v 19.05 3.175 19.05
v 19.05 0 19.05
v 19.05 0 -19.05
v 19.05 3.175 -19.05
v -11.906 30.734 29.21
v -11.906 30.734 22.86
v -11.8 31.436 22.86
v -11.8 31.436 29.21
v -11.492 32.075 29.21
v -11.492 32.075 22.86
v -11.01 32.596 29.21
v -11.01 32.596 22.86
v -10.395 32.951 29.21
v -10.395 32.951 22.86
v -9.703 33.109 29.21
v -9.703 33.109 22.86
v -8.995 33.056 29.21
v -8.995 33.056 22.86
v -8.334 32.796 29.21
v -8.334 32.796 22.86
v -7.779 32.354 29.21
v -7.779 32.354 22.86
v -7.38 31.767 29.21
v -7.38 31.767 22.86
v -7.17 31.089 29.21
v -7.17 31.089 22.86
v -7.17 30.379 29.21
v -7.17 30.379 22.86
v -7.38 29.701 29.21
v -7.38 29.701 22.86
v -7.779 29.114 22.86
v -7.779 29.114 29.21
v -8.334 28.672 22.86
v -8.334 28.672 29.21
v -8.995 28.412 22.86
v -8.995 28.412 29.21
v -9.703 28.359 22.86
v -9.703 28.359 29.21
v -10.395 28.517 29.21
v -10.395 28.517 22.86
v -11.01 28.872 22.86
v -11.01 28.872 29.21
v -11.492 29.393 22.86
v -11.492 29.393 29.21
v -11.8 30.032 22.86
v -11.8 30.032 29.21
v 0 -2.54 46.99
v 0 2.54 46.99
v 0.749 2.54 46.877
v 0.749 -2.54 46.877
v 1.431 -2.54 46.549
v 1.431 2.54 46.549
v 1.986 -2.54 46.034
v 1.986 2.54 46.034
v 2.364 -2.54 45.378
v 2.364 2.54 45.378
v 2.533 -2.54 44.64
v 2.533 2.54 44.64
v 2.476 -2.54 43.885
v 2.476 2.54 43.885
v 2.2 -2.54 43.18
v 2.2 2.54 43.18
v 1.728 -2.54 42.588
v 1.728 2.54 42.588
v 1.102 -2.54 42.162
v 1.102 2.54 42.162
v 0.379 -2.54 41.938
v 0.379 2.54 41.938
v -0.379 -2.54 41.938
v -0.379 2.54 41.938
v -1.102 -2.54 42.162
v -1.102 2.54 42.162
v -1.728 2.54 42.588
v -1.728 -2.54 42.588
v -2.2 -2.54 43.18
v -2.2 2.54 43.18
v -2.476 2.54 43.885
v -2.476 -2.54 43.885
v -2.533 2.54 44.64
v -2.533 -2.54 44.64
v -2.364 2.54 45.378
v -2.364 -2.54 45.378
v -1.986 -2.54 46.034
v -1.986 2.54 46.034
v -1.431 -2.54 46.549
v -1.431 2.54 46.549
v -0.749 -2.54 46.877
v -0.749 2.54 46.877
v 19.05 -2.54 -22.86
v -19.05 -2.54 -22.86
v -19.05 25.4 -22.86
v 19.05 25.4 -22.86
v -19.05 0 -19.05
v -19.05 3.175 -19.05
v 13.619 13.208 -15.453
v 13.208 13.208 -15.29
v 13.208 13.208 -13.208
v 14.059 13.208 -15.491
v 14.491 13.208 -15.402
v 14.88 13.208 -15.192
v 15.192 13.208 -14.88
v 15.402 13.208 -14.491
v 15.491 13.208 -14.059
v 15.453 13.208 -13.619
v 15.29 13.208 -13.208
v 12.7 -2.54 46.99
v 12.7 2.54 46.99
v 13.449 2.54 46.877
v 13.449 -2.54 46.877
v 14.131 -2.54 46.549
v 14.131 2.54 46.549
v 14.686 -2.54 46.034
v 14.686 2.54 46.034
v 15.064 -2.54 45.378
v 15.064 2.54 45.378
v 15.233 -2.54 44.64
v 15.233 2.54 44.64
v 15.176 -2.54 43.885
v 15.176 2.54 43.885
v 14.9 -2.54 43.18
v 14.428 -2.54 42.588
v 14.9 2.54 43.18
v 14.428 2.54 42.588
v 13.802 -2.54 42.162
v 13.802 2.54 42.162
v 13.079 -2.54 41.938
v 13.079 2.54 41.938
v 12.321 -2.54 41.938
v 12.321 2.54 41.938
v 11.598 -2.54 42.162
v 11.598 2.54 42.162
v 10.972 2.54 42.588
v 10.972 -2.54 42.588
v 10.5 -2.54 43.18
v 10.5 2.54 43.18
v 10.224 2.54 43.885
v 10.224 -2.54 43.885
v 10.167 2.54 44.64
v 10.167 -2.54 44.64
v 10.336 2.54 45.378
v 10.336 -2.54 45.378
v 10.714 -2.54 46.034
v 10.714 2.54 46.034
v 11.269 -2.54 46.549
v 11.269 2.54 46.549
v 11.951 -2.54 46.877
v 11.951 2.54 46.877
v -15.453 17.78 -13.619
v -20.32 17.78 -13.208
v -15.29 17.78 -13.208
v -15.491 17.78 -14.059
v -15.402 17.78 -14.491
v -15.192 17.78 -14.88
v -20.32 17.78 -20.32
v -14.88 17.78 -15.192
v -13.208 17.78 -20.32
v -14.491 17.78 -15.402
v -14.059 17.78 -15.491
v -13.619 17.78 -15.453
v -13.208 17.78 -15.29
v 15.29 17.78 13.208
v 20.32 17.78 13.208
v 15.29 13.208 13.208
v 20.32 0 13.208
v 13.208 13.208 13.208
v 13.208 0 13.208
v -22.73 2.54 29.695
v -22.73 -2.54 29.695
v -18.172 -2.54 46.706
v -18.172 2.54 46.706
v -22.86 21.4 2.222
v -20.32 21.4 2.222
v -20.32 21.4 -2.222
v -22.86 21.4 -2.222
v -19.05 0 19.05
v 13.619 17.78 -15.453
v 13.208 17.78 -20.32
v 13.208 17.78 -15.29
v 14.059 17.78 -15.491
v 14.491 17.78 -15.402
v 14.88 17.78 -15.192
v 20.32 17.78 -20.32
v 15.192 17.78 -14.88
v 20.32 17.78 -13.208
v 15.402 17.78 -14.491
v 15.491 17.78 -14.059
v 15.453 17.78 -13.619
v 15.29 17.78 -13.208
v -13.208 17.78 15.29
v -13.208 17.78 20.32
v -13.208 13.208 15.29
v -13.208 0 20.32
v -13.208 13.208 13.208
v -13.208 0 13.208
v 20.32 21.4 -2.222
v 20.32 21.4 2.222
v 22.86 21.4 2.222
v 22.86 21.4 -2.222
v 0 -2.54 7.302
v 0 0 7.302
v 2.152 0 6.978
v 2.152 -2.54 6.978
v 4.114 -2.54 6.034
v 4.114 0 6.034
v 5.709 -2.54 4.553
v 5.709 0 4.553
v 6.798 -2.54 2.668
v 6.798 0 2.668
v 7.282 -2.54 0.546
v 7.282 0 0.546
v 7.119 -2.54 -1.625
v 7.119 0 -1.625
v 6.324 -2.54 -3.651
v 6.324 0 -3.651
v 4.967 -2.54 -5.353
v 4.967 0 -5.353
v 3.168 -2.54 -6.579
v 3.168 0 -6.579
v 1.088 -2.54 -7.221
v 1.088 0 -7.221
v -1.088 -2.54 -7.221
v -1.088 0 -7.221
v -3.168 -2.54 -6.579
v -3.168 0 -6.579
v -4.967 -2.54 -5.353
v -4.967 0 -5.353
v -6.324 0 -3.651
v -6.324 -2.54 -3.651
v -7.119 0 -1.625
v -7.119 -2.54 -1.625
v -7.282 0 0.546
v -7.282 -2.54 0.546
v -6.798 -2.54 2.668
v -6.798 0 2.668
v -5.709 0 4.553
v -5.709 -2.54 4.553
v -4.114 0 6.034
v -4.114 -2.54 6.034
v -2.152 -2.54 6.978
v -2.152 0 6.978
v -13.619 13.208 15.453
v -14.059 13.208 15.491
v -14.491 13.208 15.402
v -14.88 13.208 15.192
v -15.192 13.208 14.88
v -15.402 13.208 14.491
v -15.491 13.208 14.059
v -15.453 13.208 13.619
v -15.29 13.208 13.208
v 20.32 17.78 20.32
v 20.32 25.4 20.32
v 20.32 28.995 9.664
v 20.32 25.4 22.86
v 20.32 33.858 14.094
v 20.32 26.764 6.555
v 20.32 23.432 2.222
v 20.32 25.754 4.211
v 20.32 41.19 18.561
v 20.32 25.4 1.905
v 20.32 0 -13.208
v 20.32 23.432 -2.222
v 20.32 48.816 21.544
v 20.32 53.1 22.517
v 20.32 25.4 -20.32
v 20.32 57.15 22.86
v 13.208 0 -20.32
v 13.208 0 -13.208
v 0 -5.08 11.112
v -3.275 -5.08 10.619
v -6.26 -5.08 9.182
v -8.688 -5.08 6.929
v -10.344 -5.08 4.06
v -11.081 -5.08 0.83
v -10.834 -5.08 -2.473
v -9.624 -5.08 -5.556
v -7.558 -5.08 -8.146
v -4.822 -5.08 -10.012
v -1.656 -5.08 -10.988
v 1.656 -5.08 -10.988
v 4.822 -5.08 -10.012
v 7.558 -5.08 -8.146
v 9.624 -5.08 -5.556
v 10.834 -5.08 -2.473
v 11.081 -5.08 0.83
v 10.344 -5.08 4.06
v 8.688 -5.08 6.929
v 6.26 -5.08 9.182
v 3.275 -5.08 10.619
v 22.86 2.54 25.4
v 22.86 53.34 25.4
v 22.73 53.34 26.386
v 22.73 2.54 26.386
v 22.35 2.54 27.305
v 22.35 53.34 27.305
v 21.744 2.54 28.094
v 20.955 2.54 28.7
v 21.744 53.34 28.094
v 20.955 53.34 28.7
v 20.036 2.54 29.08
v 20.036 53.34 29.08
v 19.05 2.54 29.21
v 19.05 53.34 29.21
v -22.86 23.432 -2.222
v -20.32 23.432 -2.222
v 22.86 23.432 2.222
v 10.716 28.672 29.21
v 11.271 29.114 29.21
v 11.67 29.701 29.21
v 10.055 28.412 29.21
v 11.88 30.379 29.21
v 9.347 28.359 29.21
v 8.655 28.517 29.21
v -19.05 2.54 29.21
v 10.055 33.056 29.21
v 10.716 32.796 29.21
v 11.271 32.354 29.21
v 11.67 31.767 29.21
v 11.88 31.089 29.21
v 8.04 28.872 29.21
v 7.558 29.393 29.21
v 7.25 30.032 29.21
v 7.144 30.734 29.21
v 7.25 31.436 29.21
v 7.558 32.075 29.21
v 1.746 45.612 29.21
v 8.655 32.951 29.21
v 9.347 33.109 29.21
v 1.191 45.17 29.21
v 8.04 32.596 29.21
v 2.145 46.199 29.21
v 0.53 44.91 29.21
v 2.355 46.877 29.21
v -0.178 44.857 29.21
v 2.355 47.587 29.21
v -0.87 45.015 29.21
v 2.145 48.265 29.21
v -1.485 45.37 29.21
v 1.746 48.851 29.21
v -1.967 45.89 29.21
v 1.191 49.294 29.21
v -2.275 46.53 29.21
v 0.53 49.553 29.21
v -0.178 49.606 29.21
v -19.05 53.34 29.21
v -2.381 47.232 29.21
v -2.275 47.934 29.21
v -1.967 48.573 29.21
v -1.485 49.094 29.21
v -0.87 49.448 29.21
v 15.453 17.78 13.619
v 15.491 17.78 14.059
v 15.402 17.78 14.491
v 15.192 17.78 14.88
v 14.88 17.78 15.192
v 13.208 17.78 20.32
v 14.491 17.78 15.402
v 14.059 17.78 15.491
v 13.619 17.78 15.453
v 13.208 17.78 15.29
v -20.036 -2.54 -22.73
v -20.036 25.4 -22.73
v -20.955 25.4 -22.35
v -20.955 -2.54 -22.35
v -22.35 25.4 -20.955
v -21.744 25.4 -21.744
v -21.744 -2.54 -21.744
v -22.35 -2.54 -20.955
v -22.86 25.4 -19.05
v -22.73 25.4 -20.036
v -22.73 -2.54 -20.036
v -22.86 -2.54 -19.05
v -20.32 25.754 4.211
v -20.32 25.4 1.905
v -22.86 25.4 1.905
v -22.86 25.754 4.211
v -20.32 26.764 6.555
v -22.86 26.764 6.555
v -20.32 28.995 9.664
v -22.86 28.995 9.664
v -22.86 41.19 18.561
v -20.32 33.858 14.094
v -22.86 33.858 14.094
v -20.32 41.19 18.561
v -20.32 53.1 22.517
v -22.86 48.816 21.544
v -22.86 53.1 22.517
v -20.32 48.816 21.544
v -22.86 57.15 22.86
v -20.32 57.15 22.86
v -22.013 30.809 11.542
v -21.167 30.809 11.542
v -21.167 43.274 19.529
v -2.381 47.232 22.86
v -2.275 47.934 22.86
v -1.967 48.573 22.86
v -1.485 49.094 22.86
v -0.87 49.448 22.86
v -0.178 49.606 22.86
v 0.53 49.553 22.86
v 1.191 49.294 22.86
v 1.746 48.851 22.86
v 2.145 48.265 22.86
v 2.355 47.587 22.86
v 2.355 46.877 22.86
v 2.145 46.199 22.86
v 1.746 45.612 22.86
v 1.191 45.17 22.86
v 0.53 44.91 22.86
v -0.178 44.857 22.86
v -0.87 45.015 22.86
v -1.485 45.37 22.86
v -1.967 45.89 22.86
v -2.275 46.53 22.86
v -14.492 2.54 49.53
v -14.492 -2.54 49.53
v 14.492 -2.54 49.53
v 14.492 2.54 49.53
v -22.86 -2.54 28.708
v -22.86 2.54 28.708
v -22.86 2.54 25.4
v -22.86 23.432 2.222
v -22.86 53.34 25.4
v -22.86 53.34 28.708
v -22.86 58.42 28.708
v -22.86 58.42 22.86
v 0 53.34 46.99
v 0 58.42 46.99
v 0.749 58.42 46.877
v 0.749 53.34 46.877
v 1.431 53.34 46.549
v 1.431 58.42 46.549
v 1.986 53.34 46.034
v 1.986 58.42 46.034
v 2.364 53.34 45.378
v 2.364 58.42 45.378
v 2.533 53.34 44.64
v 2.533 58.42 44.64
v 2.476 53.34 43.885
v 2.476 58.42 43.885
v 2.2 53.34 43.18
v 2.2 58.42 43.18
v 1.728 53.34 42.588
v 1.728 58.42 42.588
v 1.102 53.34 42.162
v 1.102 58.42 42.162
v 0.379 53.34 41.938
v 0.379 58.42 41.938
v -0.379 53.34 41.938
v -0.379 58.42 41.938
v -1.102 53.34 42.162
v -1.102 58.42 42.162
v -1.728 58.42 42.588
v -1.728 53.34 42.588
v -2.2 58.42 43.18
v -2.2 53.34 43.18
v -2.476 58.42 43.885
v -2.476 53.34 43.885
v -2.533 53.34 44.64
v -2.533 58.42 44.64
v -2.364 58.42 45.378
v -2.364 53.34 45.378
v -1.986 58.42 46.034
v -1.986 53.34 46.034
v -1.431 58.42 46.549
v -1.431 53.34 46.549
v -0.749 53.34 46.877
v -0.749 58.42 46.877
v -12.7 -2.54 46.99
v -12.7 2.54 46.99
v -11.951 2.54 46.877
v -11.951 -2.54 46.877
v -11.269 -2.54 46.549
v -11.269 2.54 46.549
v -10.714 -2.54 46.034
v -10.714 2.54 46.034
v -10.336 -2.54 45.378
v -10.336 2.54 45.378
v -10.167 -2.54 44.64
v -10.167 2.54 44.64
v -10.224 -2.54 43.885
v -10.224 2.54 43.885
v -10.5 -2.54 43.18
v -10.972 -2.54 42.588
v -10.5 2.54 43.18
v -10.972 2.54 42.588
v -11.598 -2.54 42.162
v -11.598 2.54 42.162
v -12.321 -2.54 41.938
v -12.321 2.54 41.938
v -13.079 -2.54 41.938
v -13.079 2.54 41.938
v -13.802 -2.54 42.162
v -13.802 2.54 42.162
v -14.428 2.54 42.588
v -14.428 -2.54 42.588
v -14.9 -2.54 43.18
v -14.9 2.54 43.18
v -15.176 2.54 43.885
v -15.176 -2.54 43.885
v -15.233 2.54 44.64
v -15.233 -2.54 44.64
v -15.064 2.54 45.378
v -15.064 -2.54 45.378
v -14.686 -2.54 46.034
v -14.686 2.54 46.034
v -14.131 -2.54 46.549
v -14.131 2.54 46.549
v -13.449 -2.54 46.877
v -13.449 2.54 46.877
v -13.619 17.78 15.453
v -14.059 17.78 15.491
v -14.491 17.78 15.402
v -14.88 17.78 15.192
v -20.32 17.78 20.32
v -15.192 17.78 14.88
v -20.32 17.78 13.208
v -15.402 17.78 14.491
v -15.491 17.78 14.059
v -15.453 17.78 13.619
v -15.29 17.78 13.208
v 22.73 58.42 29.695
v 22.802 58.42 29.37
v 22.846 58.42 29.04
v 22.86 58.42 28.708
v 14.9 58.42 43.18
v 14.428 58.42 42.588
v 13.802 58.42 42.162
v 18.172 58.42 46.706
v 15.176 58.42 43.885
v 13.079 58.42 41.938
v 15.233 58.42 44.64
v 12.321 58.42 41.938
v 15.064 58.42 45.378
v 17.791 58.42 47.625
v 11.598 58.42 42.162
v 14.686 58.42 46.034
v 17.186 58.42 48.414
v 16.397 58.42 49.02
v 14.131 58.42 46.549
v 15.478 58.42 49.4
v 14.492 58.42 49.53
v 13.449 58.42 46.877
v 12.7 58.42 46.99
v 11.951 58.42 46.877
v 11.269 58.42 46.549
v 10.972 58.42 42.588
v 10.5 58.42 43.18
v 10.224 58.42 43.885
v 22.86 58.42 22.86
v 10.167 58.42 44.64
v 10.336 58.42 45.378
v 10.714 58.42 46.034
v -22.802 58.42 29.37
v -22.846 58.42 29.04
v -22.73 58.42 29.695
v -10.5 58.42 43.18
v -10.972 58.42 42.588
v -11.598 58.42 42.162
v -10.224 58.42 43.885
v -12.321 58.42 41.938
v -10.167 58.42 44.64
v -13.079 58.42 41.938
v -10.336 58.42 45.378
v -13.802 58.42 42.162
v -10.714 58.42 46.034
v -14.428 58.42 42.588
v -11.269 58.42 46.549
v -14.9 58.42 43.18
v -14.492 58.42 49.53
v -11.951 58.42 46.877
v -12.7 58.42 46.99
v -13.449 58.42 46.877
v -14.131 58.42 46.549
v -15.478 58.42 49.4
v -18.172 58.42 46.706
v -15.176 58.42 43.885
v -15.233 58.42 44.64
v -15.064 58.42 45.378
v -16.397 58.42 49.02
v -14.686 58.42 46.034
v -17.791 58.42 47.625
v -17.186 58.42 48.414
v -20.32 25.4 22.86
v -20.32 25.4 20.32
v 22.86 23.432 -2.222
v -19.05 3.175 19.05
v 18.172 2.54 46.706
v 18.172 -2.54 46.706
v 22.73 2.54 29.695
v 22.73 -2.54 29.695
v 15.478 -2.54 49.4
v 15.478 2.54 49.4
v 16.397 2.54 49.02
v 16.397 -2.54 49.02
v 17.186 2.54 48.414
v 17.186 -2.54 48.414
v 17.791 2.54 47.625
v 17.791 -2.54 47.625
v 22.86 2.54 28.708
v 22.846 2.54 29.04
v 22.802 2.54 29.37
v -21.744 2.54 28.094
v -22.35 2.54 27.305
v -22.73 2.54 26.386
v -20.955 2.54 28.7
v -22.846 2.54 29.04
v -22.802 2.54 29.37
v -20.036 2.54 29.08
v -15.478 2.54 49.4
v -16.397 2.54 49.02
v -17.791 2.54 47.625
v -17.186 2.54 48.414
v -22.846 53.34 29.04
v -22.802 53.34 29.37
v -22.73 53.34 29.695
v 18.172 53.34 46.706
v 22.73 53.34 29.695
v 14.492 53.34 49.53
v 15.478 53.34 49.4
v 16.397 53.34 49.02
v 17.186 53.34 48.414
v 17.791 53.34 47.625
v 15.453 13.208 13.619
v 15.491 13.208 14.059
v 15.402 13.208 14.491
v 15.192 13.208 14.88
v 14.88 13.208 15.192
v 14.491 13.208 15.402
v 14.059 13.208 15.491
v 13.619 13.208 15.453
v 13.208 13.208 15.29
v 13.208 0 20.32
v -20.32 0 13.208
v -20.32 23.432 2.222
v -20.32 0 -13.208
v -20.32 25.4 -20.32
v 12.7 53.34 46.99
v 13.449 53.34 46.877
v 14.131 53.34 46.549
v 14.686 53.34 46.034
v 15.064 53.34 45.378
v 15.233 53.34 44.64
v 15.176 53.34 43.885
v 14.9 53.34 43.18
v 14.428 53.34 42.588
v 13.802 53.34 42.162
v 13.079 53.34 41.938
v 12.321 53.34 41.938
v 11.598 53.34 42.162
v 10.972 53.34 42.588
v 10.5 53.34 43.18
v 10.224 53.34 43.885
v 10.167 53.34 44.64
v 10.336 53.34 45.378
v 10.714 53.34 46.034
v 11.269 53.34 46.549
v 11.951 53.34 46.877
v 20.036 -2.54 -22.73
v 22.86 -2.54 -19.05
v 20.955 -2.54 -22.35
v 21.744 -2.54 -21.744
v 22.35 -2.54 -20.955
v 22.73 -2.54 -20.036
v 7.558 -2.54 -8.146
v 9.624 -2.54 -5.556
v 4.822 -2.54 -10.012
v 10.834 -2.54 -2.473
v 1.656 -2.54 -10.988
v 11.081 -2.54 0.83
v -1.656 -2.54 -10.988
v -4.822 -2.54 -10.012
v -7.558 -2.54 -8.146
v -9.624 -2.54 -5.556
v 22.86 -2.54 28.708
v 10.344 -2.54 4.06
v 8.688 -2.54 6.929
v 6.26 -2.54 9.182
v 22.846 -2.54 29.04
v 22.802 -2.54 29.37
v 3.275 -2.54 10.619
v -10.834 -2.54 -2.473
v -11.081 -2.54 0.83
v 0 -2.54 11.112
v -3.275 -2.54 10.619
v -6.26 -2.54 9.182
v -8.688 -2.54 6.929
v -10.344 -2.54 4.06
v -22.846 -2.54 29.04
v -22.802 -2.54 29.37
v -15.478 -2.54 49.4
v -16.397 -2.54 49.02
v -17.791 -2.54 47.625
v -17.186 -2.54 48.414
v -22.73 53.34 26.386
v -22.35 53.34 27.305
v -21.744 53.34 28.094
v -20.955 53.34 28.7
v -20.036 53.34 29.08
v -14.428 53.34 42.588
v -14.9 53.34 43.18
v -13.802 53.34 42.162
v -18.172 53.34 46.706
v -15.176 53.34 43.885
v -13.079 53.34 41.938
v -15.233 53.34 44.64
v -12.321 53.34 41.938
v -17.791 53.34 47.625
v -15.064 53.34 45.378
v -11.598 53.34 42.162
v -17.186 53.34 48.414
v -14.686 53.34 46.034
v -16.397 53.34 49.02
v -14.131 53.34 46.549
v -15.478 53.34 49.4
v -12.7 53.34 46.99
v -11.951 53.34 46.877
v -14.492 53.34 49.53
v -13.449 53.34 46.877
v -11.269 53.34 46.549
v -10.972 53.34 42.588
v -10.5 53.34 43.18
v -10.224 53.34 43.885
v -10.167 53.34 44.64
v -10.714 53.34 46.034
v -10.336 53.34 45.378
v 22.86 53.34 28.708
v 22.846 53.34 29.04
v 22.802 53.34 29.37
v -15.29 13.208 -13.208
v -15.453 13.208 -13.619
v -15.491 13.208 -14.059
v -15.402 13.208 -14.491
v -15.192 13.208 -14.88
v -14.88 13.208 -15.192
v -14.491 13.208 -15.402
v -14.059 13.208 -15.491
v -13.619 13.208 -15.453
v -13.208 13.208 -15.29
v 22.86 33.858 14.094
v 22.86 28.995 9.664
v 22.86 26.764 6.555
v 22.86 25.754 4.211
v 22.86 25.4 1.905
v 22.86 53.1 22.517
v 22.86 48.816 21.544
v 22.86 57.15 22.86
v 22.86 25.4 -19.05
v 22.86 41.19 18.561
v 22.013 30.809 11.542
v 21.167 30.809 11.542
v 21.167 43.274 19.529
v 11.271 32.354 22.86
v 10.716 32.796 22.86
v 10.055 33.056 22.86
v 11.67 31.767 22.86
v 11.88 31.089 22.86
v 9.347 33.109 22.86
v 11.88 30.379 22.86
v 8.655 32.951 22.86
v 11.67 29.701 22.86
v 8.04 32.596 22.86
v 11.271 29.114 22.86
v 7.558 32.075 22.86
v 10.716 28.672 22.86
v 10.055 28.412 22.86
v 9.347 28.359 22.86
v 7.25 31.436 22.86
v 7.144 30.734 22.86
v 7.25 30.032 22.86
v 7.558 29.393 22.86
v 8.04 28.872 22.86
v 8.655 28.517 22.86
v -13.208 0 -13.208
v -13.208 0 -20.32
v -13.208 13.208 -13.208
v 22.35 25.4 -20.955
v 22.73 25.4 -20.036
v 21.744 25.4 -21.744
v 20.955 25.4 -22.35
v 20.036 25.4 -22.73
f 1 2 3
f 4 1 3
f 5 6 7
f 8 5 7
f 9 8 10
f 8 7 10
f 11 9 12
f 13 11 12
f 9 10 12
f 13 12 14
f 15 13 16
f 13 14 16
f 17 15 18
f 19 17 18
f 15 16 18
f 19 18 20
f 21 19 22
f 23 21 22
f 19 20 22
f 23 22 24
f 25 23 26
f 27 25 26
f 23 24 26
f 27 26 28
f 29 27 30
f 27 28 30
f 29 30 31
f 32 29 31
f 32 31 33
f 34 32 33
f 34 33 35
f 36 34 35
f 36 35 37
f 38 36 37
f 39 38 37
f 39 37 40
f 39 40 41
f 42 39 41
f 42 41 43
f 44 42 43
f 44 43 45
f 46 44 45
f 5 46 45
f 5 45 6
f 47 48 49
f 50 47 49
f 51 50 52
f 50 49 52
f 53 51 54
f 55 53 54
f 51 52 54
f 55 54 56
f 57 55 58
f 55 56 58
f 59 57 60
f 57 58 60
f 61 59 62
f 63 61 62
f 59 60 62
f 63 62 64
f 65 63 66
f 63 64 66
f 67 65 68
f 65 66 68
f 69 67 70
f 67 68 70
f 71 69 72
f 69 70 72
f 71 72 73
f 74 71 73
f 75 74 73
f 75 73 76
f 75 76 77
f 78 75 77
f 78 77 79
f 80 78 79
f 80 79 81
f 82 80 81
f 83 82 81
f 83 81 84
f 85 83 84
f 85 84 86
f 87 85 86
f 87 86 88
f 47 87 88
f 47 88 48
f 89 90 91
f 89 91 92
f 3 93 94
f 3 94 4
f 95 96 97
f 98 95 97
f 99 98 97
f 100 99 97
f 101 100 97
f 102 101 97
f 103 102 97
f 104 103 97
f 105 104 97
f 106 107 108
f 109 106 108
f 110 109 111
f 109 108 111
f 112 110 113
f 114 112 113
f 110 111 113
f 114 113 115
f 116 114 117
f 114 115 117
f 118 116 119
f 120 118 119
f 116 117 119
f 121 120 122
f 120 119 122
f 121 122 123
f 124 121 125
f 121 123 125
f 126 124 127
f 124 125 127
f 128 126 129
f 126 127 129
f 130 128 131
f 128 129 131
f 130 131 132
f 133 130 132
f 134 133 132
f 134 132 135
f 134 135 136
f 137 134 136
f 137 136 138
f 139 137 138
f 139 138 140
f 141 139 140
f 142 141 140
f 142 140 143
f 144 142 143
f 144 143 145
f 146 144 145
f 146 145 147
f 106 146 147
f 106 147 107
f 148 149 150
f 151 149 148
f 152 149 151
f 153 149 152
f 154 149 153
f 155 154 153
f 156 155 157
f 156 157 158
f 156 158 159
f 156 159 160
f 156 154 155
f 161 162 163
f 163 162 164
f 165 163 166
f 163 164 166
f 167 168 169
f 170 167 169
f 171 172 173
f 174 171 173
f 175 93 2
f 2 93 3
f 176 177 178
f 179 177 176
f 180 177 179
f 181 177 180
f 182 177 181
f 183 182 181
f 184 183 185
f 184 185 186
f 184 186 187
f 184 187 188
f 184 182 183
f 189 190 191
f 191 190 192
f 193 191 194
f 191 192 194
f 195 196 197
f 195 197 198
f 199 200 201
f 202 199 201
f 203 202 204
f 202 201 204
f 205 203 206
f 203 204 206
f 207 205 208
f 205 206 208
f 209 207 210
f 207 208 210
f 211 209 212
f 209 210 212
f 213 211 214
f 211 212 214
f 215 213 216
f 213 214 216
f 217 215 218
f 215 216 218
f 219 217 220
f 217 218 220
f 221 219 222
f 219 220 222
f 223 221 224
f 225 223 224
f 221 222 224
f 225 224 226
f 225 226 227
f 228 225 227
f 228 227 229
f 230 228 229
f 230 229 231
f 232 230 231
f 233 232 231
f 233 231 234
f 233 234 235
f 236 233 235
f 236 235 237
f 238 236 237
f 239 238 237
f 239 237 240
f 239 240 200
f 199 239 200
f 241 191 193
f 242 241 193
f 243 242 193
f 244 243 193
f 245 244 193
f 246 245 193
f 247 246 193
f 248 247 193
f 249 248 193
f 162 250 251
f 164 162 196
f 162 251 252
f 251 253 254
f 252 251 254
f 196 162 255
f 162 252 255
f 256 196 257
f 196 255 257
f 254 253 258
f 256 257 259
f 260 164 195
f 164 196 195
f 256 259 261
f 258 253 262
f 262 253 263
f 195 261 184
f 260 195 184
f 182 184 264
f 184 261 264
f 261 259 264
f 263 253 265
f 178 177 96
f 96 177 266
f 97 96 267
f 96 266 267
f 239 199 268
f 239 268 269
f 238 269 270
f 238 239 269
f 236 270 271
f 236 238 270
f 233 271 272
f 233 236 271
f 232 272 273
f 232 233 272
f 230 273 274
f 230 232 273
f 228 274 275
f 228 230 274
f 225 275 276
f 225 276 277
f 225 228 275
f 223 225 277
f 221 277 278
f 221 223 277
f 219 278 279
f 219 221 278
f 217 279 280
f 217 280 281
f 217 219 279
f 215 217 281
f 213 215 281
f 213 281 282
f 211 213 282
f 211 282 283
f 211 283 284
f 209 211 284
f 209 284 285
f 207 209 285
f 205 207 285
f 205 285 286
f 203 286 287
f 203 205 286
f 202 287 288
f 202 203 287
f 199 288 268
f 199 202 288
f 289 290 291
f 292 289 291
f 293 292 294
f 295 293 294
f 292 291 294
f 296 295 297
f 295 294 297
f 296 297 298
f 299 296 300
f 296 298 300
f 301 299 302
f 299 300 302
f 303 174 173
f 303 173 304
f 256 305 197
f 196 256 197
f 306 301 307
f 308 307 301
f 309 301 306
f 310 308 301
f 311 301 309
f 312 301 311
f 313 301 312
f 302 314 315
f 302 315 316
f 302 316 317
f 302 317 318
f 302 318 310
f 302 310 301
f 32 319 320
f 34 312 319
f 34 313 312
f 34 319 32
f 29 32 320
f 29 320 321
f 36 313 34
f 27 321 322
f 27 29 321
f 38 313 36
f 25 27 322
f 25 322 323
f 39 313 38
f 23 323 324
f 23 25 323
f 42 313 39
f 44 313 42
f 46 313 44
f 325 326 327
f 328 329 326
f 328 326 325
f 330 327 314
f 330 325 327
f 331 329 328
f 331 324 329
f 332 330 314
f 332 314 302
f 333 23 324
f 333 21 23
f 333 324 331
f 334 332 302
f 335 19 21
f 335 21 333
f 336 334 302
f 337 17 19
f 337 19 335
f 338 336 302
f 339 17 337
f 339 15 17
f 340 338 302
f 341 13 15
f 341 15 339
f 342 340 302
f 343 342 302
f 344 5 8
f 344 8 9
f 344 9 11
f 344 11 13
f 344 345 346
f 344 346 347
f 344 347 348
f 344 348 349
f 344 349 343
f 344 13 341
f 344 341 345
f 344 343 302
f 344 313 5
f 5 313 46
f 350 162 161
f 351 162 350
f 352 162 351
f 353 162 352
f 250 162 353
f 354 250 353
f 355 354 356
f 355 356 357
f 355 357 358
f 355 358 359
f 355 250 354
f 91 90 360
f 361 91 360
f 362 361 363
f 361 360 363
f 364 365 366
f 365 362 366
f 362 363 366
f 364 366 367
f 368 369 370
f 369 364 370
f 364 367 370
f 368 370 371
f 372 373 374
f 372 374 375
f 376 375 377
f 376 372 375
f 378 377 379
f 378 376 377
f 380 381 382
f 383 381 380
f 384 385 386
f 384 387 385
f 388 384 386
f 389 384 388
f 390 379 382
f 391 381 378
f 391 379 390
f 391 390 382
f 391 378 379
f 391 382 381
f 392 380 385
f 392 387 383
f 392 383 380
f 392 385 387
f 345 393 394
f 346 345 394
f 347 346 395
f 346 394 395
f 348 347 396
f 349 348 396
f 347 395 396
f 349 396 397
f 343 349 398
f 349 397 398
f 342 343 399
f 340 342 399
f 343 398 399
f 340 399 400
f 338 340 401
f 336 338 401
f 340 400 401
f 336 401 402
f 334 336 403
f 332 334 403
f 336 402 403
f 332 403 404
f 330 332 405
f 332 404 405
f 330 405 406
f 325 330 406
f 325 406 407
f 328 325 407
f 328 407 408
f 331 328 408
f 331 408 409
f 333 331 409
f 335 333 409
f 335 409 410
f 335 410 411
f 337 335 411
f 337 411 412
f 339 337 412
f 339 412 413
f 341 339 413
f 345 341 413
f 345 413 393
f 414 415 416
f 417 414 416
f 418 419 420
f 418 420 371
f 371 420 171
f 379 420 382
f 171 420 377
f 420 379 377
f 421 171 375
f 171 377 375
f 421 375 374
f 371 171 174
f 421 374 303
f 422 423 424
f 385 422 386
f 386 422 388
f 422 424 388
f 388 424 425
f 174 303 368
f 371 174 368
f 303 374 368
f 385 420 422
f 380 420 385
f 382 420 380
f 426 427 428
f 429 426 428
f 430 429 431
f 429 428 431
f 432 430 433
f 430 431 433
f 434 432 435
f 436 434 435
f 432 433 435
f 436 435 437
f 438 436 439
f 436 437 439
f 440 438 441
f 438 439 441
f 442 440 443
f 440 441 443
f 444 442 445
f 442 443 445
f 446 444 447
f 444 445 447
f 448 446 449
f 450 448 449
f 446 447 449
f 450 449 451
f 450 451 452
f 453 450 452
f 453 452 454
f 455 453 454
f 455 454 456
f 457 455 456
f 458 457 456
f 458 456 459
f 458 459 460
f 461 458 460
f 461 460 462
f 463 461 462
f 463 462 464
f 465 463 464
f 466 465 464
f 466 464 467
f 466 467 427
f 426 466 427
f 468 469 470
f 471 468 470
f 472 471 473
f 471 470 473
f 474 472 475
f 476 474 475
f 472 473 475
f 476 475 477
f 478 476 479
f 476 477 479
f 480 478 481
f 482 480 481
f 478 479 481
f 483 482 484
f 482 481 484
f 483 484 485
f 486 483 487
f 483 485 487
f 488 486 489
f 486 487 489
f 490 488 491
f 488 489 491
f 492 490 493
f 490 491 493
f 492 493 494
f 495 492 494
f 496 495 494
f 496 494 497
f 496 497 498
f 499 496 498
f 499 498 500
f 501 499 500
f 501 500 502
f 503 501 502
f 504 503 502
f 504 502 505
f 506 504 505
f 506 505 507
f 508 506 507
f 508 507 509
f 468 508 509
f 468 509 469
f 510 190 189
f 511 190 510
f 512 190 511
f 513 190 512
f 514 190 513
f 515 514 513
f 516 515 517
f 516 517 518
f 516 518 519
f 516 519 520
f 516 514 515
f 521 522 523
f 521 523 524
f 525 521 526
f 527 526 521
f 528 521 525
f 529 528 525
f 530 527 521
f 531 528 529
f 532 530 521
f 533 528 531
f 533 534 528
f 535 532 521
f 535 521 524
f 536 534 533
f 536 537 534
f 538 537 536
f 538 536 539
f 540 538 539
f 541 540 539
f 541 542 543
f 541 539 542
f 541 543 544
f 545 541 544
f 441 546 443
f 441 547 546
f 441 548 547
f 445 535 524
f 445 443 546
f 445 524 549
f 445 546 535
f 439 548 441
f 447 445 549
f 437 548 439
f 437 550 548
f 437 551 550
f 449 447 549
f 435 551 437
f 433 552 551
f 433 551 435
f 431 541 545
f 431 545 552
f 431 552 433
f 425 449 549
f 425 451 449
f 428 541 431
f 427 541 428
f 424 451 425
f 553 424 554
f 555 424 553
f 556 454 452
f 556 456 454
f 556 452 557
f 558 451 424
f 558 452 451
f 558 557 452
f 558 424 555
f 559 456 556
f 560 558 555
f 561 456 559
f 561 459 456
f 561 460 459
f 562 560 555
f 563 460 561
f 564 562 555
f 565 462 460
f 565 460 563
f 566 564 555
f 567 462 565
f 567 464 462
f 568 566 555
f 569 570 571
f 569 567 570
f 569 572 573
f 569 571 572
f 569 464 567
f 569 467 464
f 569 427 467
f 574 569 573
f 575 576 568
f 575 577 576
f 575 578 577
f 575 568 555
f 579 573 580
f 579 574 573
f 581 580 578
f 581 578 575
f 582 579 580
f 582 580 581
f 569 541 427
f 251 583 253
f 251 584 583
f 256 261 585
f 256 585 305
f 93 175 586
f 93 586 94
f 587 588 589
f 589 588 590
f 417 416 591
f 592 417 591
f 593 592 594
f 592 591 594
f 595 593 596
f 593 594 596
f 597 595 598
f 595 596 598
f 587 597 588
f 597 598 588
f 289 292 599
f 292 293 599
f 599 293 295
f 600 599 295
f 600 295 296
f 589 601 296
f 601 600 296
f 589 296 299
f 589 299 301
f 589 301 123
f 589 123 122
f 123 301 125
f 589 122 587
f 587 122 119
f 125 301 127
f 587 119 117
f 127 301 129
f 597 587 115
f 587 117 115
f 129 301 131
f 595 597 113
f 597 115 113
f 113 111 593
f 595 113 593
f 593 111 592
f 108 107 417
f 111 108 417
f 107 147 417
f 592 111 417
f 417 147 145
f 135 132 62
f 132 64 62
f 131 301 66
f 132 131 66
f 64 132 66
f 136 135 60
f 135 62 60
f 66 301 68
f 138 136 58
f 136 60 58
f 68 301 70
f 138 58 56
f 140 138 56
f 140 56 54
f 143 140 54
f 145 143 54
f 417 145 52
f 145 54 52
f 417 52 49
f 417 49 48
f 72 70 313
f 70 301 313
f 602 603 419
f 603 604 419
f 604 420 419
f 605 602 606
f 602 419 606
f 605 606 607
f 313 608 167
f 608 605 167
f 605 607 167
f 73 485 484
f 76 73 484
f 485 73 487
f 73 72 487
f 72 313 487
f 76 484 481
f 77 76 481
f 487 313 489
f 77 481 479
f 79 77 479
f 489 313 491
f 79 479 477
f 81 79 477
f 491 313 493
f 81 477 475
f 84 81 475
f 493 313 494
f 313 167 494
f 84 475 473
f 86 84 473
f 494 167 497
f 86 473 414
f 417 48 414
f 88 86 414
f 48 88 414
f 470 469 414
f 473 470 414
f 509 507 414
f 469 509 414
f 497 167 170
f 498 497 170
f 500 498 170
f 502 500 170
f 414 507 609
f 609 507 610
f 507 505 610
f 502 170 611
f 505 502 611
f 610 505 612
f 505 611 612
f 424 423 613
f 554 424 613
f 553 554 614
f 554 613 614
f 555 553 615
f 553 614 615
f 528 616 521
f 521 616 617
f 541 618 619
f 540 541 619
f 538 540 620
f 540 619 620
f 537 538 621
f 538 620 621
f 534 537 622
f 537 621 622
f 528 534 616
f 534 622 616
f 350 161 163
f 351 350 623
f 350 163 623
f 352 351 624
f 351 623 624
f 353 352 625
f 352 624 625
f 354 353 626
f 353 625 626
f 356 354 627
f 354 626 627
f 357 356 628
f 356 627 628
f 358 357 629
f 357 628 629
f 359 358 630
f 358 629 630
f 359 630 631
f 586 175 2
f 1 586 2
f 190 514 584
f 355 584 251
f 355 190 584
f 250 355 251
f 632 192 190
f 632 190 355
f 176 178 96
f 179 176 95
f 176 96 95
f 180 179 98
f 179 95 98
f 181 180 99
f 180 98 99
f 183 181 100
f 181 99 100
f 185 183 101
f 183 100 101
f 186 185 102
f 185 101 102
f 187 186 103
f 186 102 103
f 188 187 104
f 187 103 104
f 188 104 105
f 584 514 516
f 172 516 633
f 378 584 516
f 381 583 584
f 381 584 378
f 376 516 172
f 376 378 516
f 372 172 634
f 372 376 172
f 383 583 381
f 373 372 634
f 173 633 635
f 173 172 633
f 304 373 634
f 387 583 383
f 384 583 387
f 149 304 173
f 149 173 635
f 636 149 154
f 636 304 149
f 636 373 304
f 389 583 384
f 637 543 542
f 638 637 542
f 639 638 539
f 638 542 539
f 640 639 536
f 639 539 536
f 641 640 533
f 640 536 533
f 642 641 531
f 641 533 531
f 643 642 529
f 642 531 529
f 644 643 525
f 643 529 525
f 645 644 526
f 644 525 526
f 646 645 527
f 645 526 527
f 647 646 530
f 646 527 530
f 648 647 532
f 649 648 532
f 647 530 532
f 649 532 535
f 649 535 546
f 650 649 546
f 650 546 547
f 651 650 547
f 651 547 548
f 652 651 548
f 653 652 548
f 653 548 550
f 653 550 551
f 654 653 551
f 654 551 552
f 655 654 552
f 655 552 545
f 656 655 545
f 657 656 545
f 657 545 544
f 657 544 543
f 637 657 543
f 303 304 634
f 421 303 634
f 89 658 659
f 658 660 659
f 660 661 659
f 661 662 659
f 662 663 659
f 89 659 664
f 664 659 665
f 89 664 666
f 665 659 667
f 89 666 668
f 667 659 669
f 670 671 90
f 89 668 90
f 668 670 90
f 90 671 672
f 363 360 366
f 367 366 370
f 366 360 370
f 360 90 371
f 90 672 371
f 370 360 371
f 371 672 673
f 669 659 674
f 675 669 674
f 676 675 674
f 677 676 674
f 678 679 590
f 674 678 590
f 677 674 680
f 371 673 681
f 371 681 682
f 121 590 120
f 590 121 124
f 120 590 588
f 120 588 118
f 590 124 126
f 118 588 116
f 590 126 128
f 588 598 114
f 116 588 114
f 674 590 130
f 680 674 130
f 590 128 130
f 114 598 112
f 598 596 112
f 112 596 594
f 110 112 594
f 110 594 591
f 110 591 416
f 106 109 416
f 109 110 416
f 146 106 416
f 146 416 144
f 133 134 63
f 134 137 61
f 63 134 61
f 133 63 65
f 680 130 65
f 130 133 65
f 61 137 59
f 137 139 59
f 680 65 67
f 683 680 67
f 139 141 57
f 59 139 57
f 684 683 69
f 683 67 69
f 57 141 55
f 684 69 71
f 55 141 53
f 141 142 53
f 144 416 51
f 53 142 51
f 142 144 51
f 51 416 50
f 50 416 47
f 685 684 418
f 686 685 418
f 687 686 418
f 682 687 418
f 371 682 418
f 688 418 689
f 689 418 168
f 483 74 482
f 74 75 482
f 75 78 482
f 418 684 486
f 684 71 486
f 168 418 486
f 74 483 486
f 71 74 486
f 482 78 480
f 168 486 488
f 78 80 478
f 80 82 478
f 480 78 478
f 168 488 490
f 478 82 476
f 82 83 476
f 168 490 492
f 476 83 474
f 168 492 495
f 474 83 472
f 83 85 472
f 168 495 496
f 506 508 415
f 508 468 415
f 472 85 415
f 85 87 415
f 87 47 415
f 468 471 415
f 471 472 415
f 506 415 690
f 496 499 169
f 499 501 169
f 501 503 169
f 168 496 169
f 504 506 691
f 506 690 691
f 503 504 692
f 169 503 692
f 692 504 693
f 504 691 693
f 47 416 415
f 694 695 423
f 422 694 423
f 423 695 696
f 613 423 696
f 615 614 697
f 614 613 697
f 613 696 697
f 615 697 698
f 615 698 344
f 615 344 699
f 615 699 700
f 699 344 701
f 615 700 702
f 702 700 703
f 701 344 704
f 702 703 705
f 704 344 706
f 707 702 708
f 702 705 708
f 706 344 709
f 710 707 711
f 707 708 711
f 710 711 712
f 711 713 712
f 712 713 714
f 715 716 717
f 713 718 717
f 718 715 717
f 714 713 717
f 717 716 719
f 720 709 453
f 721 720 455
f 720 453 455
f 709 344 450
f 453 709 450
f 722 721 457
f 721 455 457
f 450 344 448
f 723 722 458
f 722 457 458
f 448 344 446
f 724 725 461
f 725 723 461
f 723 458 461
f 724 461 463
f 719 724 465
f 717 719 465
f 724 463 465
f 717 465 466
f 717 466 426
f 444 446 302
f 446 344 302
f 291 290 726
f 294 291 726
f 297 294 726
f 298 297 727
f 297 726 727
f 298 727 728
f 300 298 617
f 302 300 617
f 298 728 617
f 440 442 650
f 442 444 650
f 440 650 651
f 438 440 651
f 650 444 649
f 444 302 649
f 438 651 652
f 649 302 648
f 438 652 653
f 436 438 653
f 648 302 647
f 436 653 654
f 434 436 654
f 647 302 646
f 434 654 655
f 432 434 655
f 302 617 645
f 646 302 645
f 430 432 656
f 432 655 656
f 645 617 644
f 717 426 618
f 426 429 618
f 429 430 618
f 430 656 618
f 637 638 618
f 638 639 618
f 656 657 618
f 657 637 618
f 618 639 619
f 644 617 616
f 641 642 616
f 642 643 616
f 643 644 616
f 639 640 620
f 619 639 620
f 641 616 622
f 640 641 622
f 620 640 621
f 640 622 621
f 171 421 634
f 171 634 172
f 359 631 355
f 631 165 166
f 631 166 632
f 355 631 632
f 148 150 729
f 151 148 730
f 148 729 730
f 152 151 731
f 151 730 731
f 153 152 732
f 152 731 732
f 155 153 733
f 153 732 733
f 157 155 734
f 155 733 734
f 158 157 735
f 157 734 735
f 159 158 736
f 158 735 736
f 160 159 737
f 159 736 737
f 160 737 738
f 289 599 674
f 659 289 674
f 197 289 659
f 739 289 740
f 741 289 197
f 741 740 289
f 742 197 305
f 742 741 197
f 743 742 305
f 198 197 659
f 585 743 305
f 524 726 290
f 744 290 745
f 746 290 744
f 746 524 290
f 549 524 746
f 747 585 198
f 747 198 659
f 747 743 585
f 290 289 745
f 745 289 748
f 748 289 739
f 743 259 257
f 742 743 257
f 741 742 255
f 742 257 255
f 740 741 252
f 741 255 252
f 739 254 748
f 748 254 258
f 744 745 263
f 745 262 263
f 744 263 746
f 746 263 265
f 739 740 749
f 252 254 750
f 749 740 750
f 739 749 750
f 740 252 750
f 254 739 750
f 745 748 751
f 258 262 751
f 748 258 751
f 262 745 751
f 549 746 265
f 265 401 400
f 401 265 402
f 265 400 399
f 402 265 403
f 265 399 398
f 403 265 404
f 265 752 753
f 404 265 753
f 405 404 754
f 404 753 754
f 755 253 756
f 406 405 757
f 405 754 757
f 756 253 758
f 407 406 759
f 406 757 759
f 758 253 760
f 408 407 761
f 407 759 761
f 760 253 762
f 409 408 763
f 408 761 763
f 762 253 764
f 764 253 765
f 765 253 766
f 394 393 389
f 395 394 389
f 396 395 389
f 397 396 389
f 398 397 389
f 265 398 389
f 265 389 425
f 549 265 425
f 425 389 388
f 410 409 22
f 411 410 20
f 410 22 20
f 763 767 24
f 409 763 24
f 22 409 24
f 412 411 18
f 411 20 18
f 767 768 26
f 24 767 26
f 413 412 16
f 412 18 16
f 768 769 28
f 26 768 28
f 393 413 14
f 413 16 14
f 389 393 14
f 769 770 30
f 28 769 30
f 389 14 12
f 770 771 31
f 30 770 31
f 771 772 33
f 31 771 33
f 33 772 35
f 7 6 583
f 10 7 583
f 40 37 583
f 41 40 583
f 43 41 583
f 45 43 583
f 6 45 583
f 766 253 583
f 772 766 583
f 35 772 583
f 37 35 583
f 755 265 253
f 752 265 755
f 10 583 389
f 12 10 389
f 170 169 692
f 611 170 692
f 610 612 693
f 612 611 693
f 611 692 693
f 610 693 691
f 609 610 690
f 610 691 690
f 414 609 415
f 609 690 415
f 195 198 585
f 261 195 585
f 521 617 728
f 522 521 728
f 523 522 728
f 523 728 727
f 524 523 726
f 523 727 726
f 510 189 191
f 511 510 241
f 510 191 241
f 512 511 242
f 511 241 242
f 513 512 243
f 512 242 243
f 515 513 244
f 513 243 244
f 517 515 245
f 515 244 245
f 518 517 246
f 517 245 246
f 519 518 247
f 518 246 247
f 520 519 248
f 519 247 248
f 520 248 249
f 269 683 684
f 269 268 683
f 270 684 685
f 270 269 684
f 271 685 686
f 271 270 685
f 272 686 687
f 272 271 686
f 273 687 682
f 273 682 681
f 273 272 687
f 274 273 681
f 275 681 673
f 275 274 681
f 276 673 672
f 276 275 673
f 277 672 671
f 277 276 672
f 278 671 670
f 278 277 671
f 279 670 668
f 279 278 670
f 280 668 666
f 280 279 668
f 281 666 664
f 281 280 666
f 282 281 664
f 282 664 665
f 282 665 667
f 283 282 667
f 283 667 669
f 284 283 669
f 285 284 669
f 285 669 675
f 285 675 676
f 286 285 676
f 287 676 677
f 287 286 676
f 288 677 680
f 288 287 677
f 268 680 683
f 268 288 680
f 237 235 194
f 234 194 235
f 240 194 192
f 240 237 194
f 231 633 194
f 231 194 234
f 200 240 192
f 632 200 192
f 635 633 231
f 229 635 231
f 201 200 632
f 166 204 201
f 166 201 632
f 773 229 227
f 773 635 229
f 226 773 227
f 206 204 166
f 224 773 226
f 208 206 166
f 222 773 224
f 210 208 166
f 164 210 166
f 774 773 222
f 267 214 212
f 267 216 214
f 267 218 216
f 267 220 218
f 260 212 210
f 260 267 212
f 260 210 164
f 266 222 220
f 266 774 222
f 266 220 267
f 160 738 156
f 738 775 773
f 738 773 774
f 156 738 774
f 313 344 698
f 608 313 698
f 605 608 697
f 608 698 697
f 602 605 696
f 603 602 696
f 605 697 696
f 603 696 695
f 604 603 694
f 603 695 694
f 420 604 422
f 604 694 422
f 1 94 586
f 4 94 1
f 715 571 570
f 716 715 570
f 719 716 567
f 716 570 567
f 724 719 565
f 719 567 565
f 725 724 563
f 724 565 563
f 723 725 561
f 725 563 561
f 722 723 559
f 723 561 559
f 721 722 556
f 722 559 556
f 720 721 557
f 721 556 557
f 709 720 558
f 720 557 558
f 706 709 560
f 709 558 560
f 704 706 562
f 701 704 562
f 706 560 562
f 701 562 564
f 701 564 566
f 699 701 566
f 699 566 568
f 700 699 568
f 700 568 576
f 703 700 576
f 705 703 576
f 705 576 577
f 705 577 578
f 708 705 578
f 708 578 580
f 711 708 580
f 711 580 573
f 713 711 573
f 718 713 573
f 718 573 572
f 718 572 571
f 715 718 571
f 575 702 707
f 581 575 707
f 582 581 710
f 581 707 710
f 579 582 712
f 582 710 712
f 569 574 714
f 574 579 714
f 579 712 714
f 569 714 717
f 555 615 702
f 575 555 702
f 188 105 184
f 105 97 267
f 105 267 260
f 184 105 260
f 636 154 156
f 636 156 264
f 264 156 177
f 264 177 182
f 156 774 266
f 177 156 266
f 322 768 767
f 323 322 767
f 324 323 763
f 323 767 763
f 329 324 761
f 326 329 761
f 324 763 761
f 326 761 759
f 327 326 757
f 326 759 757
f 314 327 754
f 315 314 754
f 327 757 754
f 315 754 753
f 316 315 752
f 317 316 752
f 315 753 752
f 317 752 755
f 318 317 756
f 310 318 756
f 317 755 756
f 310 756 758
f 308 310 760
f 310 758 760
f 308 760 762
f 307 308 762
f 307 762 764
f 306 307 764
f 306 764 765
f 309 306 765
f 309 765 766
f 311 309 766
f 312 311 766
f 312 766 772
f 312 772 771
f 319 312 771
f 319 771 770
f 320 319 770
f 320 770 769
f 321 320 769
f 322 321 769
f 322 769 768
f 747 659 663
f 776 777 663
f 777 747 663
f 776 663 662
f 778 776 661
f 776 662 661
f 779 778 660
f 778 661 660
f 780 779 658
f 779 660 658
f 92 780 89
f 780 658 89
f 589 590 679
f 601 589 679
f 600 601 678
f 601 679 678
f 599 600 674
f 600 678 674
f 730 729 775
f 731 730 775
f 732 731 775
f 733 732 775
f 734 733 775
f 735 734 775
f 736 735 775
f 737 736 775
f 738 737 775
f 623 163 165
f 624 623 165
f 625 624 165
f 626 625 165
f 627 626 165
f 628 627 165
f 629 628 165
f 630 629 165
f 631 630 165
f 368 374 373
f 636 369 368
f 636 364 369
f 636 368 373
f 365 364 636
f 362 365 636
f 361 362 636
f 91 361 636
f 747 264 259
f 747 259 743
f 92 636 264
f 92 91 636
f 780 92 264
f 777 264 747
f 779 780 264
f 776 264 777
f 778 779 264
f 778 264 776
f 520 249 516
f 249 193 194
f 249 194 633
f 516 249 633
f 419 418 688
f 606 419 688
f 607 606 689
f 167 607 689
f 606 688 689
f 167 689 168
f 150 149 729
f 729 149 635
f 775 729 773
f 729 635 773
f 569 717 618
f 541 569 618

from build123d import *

# Parameters (mm, degrees)
SKETCH1_W           = 40.64
SKETCH1_H           = 40.64
BOSS_EXTRUDE1_DEPTH = 25.4
SHELL1_T            = 2.54
SKETCH2_W           = 7.112
SKETCH2_H           = 7.112
BOSS_EXTRUDE2_DEPTH = 17.78
BOSS_EXTRUDE3_DEPTH = 60.96
SKETCH5_W           = 20.32
SKETCH5_H           = 50.8
CUT_EXTRUDE1_DEPTH  = 90.198854813
SKETCH6_R           = 2.54
CUT_EXTRUDE2_DEPTH  = 82.804169209
FILLET1_R           = 3.81
SKETCH10_R          = 1.524
CUT_EXTRUDE4_DEPTH  = 4.572
CIRPATTERN1_COUNT   = 4
SKETCH11_R          = 7.3025
CUT_EXTRUDE5_DEPTH  = 80.929324406
RIB1_START          = -2.54
RIB1_DEPTH          = 2.54
SKETCH19_R          = 2.38125
CUT_EXTRUDE6_DEPTH  = 78.625990598
SKETCH20_W          = 2.032
SKETCH20_H          = 4.445
SKETCH7_W           = 38.1
SKETCH7_H           = 38.1
BOSS_EXTRUDE4_DEPTH = 3.175


with BuildPart() as part:
    # Sketch1 → Boss-Extrude1 (new body)
    with BuildSketch(Plane(origin=(0, 0, 0), x_dir=(1, 0, 0), z_dir=(0, 1, 0))):
        Rectangle(SKETCH1_W, SKETCH1_H)
    extrude(amount=BOSS_EXTRUDE1_DEPTH)

    # Shell1
    shell1_openings = [part.faces().sort_by_distance(p)[0] for p in [
        (0, 25.4, 0),
    ]]
    offset(amount=SHELL1_T, openings=shell1_openings, kind=Kind.INTERSECTION)

    # Sketch2 → Boss-Extrude2 (add)
    with BuildSketch(Plane(origin=(0, 0, 0), x_dir=(1, 0, 0), z_dir=(0, 1, 0))):
        with Locations((-16.764, 16.764)):
            Rectangle(SKETCH2_W, SKETCH2_H)
    boss_extrude2 = extrude(amount=BOSS_EXTRUDE2_DEPTH)

    # Sketch3 → Boss-Extrude3 (add)
    with BuildSketch(Plane.XZ.offset(2.54)):
        with BuildLine():
            Line((-22.730177398, 29.694504546), (-17.41527241, 49.53))
            Line((-17.41527241, 49.53), (17.41527241, 49.53))
            Line((17.41527241, 49.53), (22.730177398, 29.694504546))
            ThreePointArc((22.730177398, 29.694504546), (22.827404922, 29.205708777), (22.86, 28.708403984))
            Line((22.86, 28.708403984), (22.86, 22.86))
            Line((22.86, 22.86), (-22.86, 22.86))
            Line((-22.86, 22.86), (-22.86, 28.708403984))
            ThreePointArc((-22.86, 28.708403984), (-22.827404922, 29.205708777), (-22.730177398, 29.694504546))
        make_face()
    extrude(amount=-BOSS_EXTRUDE3_DEPTH)

    # Sketch5 → Cut-Extrude1 (cut, through all)
    with BuildSketch(Plane.ZY.offset(22.86)):
        with Locations((39.37, 27.94)):
            Rectangle(SKETCH5_W, SKETCH5_H)
    extrude(amount=-CUT_EXTRUDE1_DEPTH, mode=Mode.SUBTRACT)

    # Sketch6 → Cut-Extrude2 (cut, through all)
    with BuildSketch(Plane(origin=(0, 58.42, 0), x_dir=(1, 0, 0), z_dir=(0, 1, 0))):
        with Locations(Location((-12.7, -44.45, 0), (0, 0, 270))):
            Circle(SKETCH6_R)
        with Locations(Location((0, -44.45, 0), (0, 0, 270))):
            Circle(SKETCH6_R)
        with Locations(Location((12.7, -44.45, 0), (0, 0, 270))):
            Circle(SKETCH6_R)
    extrude(amount=-CUT_EXTRUDE2_DEPTH, mode=Mode.SUBTRACT)

    # Fillet1
    # the kernel refuses this fillet: 3.81 mm, written as the material it takes off along each edge
    with BuildSketch(Plane(origin=(-17.41527241, 46.03121044, 49.53), x_dir=(-0.25881904510252424, 0, -0.9659258262890673), z_dir=(0, 1, 0)), Plane(origin=(17.41527241, 46.03121044, 49.53), x_dir=(-1, 0, 0), z_dir=(0, 1, 0)), Plane(origin=(-17.41527241, -9.84878956, 49.53), x_dir=(-0.25881904510252424, 0, -0.9659258262890673), z_dir=(0, 1, 0)), Plane(origin=(17.41527241, -9.84878956, 49.53), x_dir=(-1, 0, 0), z_dir=(0, 1, 0))) as fillet1_piece_1:
        with BuildLine():
            CenterArc((FILLET1_R * 0.767326987979, -FILLET1_R), FILLET1_R, 90, 75)
            Line((-FILLET1_R * 0.19859883831, -FILLET1_R * 0.741180954897), (0, 0))
            Line((0, 0), (FILLET1_R * 0.767326987979, 0))
        make_face()
    extrude(amount=19.697579121, mode=Mode.SUBTRACT)
    with BuildSketch(Plane(origin=(-22.826837491, 53.34, 29.21), x_dir=(-0.008703740786851863, 0, -0.999962121730776), z_dir=(0, -1, 0))) as fillet1_piece_2:
        with BuildLine():
            CenterArc((3.776983069, 3.809855684), FILLET1_R, 180.49869391, 90)
            Line((-0.032872615, 3.776694431), (-0.413858183, 3.773378306))
            Line((-0.413858183, 3.773378306), (-0.380985568, -0.003316125))
            Line((-0.380985568, -0.003316125), (-0.04687044, -0.378106019))
            ThreePointArc((-0.04687044, -0.378106019), (0.505181779, -0.409781059), (3.813460447, -0.380985568))
            Line((3.813460447, -0.380985568), (3.810144322, 0))
        make_face()
    extrude(amount=50.8, mode=Mode.SUBTRACT)
    with BuildSketch(Plane(origin=(22.826837491, 53.34, 29.21), x_dir=(0.008703740786853719, 0, -0.999962121730776), z_dir=(0, -1, 0))) as fillet1_piece_3:
        with BuildLine():
            CenterArc((3.776983069, -3.809855684), FILLET1_R, 89.50130609, 90)
            Line((-0.032872615, -3.776694431), (-0.413858183, -3.773378306))
            Line((-0.413858183, -3.773378306), (-0.380985568, 0.003316125))
            Line((-0.380985568, 0.003316125), (-0.04687044, 0.378106019))
            ThreePointArc((-0.04687044, 0.378106019), (0.505181779, 0.409781059), (3.813460447, 0.380985568))
            Line((3.813460447, 0.380985568), (3.810144322, 0))
        make_face()
    extrude(amount=50.8, mode=Mode.SUBTRACT)
    with BuildSketch(Plane(origin=(-22.86, -12.065, -22.86), x_dir=(1, 0, 0), z_dir=(0, 1, 0))) as fillet1_piece_4:
        with BuildLine():
            CenterArc((FILLET1_R, -FILLET1_R), FILLET1_R, 90, 90)
            Line((0, -FILLET1_R), (0, 0))
            Line((0, 0), (FILLET1_R, 0))
        make_face()
    extrude(amount=46.99, mode=Mode.SUBTRACT)
    with BuildSketch(Plane(origin=(22.86, -12.065, -22.86), x_dir=(-1, 0, 0), z_dir=(0, 1, 0))) as fillet1_piece_5:
        with BuildLine():
            CenterArc((FILLET1_R, FILLET1_R), FILLET1_R, 180, 90)
            Line((0, FILLET1_R), (0, 0))
            Line((0, 0), (FILLET1_R, 0))
        make_face()
    extrude(amount=46.99, mode=Mode.SUBTRACT)

    # Sketch10 → Cut-Extrude4 (cut)
    with BuildSketch(Plane.XZ.offset(-13.208)):
        with Locations((-13.97, -13.97)):
            Circle(SKETCH10_R)
    cut_extrude4 = extrude(amount=-CUT_EXTRUDE4_DEPTH, mode=Mode.SUBTRACT)

    # CirPattern1: Boss-Extrude2, Cut-Extrude4 ×4 about axis
    cirpattern1_axis = Axis((0, 0, 0), (0, 1, 0))
    add([boss_extrude2.rotate(cirpattern1_axis, i * 360 / CIRPATTERN1_COUNT) for i in range(1, CIRPATTERN1_COUNT)])
    add([cut_extrude4.rotate(cirpattern1_axis, i * 360 / CIRPATTERN1_COUNT) for i in range(1, CIRPATTERN1_COUNT)], mode=Mode.SUBTRACT)

    # Sketch11 → Cut-Extrude5 (cut, through all)
    with BuildSketch(Plane(origin=(0, 0, 0), x_dir=(1, 0, 0), z_dir=(0, 1, 0))):
        with Locations(Location((0, 0, 0), (0, 0, 270))):
            Circle(SKETCH11_R)
    extrude(amount=-CUT_EXTRUDE5_DEPTH, mode=Mode.SUBTRACT)

    # Sketch12 → Revolve1 (revolve)
    with BuildSketch(Plane.XY, mode=Mode.PRIVATE) as revolve1_sk:
        Polygon((-11.1125, -2.54), (-11.1125, -5.08), (-7.3025, -2.54), align=None)
    revolve(revolve1_sk.sketch.rotate(Axis((0, 12.66825, 0), (0, -1, 0)), 270), axis=Axis((0, 12.66825, 0), (0, -1, 0)))

    # Rib1: read off the stored shape, not the designer's step
    # Rib1 outline → Rib1 (add)
    with BuildSketch(Plane.ZY.offset(22.86).offset(RIB1_START)):
        with BuildLine():
            add(Edge.make_bspline(
                [(1.905, 25.4), (11.363397975, 25.4), (22.86, 44.45), (22.86, 57.15)],
                knots=[0, 0, 0, 0, 1, 1, 1, 1], degree=3))
            Line((1.905, 25.4), (22.86, 25.4))
            Line((22.86, 25.4), (22.86, 57.15))
        make_face()
    rib1 = extrude(amount=RIB1_DEPTH)

    # Mirror2: Rib1 across plane
    add(rib1.mirror(Plane(origin=(0, 0, 0), x_dir=(0, 0, 1), z_dir=(1, 0, 0))))

    # Sketch19 → Cut-Extrude6 (cut, through all)
    with BuildSketch(Plane(origin=(0, 0, 22.86), x_dir=(-1, 0, 0), z_dir=(0, 0, -1))):
        with Locations((-9.525, 30.734)):
            Circle(SKETCH19_R)
        with Locations((9.525, 30.734)):
            Circle(SKETCH19_R)
        with Locations((0, 47.231783942)):
            Circle(SKETCH19_R)
    extrude(amount=-CUT_EXTRUDE6_DEPTH, mode=Mode.SUBTRACT)

    # Cut-Sweep1: sweep along a path in Sketch21
    with BuildLine() as cut_sweep1_path:  # in the path sketch's own coordinates; laid on its plane below (add() does not lay a ready-made edge on the line's plane)
        Line((-22.86, 22.4155), (-19.05, 22.4155))
        add(Edge.make_bspline(
            [(-19.05, 22.4155), (-16.933333333, 22.4155), (-15.24, 23.791333333), (-15.24, 25.273)],
            knots=[0, 0, 0, 0, 1, 1, 1, 1], degree=3))
    # Sketch20 → Cut-Sweep1 (sweep, cut)
    with BuildSketch(Plane(origin=(0, 25.273, 0), x_dir=(1, 0, 0), z_dir=(0, 1, 0))):
        with Locations((-15.24, 0)):
            Rectangle(SKETCH20_W, SKETCH20_H)
    cut_sweep1 = sweep(path=Plane.XY * cut_sweep1_path.line, mode=Mode.SUBTRACT)

    # Mirror4: Cut-Sweep1 across plane
    add(cut_sweep1.mirror(Plane(origin=(0, 0, 0), x_dir=(0, 0, 1), z_dir=(1, 0, 0))), mode=Mode.SUBTRACT)


with BuildPart() as body_2:
    # Sketch7 → Boss-Extrude4 (new body)
    with BuildSketch(Plane(origin=(0, 0, 0), x_dir=(1, 0, 0), z_dir=(0, 1, 0))):
        Rectangle(SKETCH7_W, SKETCH7_H)
    extrude(amount=BOSS_EXTRUDE4_DEPTH)


solid = Compound([part.part, body_2.part])
